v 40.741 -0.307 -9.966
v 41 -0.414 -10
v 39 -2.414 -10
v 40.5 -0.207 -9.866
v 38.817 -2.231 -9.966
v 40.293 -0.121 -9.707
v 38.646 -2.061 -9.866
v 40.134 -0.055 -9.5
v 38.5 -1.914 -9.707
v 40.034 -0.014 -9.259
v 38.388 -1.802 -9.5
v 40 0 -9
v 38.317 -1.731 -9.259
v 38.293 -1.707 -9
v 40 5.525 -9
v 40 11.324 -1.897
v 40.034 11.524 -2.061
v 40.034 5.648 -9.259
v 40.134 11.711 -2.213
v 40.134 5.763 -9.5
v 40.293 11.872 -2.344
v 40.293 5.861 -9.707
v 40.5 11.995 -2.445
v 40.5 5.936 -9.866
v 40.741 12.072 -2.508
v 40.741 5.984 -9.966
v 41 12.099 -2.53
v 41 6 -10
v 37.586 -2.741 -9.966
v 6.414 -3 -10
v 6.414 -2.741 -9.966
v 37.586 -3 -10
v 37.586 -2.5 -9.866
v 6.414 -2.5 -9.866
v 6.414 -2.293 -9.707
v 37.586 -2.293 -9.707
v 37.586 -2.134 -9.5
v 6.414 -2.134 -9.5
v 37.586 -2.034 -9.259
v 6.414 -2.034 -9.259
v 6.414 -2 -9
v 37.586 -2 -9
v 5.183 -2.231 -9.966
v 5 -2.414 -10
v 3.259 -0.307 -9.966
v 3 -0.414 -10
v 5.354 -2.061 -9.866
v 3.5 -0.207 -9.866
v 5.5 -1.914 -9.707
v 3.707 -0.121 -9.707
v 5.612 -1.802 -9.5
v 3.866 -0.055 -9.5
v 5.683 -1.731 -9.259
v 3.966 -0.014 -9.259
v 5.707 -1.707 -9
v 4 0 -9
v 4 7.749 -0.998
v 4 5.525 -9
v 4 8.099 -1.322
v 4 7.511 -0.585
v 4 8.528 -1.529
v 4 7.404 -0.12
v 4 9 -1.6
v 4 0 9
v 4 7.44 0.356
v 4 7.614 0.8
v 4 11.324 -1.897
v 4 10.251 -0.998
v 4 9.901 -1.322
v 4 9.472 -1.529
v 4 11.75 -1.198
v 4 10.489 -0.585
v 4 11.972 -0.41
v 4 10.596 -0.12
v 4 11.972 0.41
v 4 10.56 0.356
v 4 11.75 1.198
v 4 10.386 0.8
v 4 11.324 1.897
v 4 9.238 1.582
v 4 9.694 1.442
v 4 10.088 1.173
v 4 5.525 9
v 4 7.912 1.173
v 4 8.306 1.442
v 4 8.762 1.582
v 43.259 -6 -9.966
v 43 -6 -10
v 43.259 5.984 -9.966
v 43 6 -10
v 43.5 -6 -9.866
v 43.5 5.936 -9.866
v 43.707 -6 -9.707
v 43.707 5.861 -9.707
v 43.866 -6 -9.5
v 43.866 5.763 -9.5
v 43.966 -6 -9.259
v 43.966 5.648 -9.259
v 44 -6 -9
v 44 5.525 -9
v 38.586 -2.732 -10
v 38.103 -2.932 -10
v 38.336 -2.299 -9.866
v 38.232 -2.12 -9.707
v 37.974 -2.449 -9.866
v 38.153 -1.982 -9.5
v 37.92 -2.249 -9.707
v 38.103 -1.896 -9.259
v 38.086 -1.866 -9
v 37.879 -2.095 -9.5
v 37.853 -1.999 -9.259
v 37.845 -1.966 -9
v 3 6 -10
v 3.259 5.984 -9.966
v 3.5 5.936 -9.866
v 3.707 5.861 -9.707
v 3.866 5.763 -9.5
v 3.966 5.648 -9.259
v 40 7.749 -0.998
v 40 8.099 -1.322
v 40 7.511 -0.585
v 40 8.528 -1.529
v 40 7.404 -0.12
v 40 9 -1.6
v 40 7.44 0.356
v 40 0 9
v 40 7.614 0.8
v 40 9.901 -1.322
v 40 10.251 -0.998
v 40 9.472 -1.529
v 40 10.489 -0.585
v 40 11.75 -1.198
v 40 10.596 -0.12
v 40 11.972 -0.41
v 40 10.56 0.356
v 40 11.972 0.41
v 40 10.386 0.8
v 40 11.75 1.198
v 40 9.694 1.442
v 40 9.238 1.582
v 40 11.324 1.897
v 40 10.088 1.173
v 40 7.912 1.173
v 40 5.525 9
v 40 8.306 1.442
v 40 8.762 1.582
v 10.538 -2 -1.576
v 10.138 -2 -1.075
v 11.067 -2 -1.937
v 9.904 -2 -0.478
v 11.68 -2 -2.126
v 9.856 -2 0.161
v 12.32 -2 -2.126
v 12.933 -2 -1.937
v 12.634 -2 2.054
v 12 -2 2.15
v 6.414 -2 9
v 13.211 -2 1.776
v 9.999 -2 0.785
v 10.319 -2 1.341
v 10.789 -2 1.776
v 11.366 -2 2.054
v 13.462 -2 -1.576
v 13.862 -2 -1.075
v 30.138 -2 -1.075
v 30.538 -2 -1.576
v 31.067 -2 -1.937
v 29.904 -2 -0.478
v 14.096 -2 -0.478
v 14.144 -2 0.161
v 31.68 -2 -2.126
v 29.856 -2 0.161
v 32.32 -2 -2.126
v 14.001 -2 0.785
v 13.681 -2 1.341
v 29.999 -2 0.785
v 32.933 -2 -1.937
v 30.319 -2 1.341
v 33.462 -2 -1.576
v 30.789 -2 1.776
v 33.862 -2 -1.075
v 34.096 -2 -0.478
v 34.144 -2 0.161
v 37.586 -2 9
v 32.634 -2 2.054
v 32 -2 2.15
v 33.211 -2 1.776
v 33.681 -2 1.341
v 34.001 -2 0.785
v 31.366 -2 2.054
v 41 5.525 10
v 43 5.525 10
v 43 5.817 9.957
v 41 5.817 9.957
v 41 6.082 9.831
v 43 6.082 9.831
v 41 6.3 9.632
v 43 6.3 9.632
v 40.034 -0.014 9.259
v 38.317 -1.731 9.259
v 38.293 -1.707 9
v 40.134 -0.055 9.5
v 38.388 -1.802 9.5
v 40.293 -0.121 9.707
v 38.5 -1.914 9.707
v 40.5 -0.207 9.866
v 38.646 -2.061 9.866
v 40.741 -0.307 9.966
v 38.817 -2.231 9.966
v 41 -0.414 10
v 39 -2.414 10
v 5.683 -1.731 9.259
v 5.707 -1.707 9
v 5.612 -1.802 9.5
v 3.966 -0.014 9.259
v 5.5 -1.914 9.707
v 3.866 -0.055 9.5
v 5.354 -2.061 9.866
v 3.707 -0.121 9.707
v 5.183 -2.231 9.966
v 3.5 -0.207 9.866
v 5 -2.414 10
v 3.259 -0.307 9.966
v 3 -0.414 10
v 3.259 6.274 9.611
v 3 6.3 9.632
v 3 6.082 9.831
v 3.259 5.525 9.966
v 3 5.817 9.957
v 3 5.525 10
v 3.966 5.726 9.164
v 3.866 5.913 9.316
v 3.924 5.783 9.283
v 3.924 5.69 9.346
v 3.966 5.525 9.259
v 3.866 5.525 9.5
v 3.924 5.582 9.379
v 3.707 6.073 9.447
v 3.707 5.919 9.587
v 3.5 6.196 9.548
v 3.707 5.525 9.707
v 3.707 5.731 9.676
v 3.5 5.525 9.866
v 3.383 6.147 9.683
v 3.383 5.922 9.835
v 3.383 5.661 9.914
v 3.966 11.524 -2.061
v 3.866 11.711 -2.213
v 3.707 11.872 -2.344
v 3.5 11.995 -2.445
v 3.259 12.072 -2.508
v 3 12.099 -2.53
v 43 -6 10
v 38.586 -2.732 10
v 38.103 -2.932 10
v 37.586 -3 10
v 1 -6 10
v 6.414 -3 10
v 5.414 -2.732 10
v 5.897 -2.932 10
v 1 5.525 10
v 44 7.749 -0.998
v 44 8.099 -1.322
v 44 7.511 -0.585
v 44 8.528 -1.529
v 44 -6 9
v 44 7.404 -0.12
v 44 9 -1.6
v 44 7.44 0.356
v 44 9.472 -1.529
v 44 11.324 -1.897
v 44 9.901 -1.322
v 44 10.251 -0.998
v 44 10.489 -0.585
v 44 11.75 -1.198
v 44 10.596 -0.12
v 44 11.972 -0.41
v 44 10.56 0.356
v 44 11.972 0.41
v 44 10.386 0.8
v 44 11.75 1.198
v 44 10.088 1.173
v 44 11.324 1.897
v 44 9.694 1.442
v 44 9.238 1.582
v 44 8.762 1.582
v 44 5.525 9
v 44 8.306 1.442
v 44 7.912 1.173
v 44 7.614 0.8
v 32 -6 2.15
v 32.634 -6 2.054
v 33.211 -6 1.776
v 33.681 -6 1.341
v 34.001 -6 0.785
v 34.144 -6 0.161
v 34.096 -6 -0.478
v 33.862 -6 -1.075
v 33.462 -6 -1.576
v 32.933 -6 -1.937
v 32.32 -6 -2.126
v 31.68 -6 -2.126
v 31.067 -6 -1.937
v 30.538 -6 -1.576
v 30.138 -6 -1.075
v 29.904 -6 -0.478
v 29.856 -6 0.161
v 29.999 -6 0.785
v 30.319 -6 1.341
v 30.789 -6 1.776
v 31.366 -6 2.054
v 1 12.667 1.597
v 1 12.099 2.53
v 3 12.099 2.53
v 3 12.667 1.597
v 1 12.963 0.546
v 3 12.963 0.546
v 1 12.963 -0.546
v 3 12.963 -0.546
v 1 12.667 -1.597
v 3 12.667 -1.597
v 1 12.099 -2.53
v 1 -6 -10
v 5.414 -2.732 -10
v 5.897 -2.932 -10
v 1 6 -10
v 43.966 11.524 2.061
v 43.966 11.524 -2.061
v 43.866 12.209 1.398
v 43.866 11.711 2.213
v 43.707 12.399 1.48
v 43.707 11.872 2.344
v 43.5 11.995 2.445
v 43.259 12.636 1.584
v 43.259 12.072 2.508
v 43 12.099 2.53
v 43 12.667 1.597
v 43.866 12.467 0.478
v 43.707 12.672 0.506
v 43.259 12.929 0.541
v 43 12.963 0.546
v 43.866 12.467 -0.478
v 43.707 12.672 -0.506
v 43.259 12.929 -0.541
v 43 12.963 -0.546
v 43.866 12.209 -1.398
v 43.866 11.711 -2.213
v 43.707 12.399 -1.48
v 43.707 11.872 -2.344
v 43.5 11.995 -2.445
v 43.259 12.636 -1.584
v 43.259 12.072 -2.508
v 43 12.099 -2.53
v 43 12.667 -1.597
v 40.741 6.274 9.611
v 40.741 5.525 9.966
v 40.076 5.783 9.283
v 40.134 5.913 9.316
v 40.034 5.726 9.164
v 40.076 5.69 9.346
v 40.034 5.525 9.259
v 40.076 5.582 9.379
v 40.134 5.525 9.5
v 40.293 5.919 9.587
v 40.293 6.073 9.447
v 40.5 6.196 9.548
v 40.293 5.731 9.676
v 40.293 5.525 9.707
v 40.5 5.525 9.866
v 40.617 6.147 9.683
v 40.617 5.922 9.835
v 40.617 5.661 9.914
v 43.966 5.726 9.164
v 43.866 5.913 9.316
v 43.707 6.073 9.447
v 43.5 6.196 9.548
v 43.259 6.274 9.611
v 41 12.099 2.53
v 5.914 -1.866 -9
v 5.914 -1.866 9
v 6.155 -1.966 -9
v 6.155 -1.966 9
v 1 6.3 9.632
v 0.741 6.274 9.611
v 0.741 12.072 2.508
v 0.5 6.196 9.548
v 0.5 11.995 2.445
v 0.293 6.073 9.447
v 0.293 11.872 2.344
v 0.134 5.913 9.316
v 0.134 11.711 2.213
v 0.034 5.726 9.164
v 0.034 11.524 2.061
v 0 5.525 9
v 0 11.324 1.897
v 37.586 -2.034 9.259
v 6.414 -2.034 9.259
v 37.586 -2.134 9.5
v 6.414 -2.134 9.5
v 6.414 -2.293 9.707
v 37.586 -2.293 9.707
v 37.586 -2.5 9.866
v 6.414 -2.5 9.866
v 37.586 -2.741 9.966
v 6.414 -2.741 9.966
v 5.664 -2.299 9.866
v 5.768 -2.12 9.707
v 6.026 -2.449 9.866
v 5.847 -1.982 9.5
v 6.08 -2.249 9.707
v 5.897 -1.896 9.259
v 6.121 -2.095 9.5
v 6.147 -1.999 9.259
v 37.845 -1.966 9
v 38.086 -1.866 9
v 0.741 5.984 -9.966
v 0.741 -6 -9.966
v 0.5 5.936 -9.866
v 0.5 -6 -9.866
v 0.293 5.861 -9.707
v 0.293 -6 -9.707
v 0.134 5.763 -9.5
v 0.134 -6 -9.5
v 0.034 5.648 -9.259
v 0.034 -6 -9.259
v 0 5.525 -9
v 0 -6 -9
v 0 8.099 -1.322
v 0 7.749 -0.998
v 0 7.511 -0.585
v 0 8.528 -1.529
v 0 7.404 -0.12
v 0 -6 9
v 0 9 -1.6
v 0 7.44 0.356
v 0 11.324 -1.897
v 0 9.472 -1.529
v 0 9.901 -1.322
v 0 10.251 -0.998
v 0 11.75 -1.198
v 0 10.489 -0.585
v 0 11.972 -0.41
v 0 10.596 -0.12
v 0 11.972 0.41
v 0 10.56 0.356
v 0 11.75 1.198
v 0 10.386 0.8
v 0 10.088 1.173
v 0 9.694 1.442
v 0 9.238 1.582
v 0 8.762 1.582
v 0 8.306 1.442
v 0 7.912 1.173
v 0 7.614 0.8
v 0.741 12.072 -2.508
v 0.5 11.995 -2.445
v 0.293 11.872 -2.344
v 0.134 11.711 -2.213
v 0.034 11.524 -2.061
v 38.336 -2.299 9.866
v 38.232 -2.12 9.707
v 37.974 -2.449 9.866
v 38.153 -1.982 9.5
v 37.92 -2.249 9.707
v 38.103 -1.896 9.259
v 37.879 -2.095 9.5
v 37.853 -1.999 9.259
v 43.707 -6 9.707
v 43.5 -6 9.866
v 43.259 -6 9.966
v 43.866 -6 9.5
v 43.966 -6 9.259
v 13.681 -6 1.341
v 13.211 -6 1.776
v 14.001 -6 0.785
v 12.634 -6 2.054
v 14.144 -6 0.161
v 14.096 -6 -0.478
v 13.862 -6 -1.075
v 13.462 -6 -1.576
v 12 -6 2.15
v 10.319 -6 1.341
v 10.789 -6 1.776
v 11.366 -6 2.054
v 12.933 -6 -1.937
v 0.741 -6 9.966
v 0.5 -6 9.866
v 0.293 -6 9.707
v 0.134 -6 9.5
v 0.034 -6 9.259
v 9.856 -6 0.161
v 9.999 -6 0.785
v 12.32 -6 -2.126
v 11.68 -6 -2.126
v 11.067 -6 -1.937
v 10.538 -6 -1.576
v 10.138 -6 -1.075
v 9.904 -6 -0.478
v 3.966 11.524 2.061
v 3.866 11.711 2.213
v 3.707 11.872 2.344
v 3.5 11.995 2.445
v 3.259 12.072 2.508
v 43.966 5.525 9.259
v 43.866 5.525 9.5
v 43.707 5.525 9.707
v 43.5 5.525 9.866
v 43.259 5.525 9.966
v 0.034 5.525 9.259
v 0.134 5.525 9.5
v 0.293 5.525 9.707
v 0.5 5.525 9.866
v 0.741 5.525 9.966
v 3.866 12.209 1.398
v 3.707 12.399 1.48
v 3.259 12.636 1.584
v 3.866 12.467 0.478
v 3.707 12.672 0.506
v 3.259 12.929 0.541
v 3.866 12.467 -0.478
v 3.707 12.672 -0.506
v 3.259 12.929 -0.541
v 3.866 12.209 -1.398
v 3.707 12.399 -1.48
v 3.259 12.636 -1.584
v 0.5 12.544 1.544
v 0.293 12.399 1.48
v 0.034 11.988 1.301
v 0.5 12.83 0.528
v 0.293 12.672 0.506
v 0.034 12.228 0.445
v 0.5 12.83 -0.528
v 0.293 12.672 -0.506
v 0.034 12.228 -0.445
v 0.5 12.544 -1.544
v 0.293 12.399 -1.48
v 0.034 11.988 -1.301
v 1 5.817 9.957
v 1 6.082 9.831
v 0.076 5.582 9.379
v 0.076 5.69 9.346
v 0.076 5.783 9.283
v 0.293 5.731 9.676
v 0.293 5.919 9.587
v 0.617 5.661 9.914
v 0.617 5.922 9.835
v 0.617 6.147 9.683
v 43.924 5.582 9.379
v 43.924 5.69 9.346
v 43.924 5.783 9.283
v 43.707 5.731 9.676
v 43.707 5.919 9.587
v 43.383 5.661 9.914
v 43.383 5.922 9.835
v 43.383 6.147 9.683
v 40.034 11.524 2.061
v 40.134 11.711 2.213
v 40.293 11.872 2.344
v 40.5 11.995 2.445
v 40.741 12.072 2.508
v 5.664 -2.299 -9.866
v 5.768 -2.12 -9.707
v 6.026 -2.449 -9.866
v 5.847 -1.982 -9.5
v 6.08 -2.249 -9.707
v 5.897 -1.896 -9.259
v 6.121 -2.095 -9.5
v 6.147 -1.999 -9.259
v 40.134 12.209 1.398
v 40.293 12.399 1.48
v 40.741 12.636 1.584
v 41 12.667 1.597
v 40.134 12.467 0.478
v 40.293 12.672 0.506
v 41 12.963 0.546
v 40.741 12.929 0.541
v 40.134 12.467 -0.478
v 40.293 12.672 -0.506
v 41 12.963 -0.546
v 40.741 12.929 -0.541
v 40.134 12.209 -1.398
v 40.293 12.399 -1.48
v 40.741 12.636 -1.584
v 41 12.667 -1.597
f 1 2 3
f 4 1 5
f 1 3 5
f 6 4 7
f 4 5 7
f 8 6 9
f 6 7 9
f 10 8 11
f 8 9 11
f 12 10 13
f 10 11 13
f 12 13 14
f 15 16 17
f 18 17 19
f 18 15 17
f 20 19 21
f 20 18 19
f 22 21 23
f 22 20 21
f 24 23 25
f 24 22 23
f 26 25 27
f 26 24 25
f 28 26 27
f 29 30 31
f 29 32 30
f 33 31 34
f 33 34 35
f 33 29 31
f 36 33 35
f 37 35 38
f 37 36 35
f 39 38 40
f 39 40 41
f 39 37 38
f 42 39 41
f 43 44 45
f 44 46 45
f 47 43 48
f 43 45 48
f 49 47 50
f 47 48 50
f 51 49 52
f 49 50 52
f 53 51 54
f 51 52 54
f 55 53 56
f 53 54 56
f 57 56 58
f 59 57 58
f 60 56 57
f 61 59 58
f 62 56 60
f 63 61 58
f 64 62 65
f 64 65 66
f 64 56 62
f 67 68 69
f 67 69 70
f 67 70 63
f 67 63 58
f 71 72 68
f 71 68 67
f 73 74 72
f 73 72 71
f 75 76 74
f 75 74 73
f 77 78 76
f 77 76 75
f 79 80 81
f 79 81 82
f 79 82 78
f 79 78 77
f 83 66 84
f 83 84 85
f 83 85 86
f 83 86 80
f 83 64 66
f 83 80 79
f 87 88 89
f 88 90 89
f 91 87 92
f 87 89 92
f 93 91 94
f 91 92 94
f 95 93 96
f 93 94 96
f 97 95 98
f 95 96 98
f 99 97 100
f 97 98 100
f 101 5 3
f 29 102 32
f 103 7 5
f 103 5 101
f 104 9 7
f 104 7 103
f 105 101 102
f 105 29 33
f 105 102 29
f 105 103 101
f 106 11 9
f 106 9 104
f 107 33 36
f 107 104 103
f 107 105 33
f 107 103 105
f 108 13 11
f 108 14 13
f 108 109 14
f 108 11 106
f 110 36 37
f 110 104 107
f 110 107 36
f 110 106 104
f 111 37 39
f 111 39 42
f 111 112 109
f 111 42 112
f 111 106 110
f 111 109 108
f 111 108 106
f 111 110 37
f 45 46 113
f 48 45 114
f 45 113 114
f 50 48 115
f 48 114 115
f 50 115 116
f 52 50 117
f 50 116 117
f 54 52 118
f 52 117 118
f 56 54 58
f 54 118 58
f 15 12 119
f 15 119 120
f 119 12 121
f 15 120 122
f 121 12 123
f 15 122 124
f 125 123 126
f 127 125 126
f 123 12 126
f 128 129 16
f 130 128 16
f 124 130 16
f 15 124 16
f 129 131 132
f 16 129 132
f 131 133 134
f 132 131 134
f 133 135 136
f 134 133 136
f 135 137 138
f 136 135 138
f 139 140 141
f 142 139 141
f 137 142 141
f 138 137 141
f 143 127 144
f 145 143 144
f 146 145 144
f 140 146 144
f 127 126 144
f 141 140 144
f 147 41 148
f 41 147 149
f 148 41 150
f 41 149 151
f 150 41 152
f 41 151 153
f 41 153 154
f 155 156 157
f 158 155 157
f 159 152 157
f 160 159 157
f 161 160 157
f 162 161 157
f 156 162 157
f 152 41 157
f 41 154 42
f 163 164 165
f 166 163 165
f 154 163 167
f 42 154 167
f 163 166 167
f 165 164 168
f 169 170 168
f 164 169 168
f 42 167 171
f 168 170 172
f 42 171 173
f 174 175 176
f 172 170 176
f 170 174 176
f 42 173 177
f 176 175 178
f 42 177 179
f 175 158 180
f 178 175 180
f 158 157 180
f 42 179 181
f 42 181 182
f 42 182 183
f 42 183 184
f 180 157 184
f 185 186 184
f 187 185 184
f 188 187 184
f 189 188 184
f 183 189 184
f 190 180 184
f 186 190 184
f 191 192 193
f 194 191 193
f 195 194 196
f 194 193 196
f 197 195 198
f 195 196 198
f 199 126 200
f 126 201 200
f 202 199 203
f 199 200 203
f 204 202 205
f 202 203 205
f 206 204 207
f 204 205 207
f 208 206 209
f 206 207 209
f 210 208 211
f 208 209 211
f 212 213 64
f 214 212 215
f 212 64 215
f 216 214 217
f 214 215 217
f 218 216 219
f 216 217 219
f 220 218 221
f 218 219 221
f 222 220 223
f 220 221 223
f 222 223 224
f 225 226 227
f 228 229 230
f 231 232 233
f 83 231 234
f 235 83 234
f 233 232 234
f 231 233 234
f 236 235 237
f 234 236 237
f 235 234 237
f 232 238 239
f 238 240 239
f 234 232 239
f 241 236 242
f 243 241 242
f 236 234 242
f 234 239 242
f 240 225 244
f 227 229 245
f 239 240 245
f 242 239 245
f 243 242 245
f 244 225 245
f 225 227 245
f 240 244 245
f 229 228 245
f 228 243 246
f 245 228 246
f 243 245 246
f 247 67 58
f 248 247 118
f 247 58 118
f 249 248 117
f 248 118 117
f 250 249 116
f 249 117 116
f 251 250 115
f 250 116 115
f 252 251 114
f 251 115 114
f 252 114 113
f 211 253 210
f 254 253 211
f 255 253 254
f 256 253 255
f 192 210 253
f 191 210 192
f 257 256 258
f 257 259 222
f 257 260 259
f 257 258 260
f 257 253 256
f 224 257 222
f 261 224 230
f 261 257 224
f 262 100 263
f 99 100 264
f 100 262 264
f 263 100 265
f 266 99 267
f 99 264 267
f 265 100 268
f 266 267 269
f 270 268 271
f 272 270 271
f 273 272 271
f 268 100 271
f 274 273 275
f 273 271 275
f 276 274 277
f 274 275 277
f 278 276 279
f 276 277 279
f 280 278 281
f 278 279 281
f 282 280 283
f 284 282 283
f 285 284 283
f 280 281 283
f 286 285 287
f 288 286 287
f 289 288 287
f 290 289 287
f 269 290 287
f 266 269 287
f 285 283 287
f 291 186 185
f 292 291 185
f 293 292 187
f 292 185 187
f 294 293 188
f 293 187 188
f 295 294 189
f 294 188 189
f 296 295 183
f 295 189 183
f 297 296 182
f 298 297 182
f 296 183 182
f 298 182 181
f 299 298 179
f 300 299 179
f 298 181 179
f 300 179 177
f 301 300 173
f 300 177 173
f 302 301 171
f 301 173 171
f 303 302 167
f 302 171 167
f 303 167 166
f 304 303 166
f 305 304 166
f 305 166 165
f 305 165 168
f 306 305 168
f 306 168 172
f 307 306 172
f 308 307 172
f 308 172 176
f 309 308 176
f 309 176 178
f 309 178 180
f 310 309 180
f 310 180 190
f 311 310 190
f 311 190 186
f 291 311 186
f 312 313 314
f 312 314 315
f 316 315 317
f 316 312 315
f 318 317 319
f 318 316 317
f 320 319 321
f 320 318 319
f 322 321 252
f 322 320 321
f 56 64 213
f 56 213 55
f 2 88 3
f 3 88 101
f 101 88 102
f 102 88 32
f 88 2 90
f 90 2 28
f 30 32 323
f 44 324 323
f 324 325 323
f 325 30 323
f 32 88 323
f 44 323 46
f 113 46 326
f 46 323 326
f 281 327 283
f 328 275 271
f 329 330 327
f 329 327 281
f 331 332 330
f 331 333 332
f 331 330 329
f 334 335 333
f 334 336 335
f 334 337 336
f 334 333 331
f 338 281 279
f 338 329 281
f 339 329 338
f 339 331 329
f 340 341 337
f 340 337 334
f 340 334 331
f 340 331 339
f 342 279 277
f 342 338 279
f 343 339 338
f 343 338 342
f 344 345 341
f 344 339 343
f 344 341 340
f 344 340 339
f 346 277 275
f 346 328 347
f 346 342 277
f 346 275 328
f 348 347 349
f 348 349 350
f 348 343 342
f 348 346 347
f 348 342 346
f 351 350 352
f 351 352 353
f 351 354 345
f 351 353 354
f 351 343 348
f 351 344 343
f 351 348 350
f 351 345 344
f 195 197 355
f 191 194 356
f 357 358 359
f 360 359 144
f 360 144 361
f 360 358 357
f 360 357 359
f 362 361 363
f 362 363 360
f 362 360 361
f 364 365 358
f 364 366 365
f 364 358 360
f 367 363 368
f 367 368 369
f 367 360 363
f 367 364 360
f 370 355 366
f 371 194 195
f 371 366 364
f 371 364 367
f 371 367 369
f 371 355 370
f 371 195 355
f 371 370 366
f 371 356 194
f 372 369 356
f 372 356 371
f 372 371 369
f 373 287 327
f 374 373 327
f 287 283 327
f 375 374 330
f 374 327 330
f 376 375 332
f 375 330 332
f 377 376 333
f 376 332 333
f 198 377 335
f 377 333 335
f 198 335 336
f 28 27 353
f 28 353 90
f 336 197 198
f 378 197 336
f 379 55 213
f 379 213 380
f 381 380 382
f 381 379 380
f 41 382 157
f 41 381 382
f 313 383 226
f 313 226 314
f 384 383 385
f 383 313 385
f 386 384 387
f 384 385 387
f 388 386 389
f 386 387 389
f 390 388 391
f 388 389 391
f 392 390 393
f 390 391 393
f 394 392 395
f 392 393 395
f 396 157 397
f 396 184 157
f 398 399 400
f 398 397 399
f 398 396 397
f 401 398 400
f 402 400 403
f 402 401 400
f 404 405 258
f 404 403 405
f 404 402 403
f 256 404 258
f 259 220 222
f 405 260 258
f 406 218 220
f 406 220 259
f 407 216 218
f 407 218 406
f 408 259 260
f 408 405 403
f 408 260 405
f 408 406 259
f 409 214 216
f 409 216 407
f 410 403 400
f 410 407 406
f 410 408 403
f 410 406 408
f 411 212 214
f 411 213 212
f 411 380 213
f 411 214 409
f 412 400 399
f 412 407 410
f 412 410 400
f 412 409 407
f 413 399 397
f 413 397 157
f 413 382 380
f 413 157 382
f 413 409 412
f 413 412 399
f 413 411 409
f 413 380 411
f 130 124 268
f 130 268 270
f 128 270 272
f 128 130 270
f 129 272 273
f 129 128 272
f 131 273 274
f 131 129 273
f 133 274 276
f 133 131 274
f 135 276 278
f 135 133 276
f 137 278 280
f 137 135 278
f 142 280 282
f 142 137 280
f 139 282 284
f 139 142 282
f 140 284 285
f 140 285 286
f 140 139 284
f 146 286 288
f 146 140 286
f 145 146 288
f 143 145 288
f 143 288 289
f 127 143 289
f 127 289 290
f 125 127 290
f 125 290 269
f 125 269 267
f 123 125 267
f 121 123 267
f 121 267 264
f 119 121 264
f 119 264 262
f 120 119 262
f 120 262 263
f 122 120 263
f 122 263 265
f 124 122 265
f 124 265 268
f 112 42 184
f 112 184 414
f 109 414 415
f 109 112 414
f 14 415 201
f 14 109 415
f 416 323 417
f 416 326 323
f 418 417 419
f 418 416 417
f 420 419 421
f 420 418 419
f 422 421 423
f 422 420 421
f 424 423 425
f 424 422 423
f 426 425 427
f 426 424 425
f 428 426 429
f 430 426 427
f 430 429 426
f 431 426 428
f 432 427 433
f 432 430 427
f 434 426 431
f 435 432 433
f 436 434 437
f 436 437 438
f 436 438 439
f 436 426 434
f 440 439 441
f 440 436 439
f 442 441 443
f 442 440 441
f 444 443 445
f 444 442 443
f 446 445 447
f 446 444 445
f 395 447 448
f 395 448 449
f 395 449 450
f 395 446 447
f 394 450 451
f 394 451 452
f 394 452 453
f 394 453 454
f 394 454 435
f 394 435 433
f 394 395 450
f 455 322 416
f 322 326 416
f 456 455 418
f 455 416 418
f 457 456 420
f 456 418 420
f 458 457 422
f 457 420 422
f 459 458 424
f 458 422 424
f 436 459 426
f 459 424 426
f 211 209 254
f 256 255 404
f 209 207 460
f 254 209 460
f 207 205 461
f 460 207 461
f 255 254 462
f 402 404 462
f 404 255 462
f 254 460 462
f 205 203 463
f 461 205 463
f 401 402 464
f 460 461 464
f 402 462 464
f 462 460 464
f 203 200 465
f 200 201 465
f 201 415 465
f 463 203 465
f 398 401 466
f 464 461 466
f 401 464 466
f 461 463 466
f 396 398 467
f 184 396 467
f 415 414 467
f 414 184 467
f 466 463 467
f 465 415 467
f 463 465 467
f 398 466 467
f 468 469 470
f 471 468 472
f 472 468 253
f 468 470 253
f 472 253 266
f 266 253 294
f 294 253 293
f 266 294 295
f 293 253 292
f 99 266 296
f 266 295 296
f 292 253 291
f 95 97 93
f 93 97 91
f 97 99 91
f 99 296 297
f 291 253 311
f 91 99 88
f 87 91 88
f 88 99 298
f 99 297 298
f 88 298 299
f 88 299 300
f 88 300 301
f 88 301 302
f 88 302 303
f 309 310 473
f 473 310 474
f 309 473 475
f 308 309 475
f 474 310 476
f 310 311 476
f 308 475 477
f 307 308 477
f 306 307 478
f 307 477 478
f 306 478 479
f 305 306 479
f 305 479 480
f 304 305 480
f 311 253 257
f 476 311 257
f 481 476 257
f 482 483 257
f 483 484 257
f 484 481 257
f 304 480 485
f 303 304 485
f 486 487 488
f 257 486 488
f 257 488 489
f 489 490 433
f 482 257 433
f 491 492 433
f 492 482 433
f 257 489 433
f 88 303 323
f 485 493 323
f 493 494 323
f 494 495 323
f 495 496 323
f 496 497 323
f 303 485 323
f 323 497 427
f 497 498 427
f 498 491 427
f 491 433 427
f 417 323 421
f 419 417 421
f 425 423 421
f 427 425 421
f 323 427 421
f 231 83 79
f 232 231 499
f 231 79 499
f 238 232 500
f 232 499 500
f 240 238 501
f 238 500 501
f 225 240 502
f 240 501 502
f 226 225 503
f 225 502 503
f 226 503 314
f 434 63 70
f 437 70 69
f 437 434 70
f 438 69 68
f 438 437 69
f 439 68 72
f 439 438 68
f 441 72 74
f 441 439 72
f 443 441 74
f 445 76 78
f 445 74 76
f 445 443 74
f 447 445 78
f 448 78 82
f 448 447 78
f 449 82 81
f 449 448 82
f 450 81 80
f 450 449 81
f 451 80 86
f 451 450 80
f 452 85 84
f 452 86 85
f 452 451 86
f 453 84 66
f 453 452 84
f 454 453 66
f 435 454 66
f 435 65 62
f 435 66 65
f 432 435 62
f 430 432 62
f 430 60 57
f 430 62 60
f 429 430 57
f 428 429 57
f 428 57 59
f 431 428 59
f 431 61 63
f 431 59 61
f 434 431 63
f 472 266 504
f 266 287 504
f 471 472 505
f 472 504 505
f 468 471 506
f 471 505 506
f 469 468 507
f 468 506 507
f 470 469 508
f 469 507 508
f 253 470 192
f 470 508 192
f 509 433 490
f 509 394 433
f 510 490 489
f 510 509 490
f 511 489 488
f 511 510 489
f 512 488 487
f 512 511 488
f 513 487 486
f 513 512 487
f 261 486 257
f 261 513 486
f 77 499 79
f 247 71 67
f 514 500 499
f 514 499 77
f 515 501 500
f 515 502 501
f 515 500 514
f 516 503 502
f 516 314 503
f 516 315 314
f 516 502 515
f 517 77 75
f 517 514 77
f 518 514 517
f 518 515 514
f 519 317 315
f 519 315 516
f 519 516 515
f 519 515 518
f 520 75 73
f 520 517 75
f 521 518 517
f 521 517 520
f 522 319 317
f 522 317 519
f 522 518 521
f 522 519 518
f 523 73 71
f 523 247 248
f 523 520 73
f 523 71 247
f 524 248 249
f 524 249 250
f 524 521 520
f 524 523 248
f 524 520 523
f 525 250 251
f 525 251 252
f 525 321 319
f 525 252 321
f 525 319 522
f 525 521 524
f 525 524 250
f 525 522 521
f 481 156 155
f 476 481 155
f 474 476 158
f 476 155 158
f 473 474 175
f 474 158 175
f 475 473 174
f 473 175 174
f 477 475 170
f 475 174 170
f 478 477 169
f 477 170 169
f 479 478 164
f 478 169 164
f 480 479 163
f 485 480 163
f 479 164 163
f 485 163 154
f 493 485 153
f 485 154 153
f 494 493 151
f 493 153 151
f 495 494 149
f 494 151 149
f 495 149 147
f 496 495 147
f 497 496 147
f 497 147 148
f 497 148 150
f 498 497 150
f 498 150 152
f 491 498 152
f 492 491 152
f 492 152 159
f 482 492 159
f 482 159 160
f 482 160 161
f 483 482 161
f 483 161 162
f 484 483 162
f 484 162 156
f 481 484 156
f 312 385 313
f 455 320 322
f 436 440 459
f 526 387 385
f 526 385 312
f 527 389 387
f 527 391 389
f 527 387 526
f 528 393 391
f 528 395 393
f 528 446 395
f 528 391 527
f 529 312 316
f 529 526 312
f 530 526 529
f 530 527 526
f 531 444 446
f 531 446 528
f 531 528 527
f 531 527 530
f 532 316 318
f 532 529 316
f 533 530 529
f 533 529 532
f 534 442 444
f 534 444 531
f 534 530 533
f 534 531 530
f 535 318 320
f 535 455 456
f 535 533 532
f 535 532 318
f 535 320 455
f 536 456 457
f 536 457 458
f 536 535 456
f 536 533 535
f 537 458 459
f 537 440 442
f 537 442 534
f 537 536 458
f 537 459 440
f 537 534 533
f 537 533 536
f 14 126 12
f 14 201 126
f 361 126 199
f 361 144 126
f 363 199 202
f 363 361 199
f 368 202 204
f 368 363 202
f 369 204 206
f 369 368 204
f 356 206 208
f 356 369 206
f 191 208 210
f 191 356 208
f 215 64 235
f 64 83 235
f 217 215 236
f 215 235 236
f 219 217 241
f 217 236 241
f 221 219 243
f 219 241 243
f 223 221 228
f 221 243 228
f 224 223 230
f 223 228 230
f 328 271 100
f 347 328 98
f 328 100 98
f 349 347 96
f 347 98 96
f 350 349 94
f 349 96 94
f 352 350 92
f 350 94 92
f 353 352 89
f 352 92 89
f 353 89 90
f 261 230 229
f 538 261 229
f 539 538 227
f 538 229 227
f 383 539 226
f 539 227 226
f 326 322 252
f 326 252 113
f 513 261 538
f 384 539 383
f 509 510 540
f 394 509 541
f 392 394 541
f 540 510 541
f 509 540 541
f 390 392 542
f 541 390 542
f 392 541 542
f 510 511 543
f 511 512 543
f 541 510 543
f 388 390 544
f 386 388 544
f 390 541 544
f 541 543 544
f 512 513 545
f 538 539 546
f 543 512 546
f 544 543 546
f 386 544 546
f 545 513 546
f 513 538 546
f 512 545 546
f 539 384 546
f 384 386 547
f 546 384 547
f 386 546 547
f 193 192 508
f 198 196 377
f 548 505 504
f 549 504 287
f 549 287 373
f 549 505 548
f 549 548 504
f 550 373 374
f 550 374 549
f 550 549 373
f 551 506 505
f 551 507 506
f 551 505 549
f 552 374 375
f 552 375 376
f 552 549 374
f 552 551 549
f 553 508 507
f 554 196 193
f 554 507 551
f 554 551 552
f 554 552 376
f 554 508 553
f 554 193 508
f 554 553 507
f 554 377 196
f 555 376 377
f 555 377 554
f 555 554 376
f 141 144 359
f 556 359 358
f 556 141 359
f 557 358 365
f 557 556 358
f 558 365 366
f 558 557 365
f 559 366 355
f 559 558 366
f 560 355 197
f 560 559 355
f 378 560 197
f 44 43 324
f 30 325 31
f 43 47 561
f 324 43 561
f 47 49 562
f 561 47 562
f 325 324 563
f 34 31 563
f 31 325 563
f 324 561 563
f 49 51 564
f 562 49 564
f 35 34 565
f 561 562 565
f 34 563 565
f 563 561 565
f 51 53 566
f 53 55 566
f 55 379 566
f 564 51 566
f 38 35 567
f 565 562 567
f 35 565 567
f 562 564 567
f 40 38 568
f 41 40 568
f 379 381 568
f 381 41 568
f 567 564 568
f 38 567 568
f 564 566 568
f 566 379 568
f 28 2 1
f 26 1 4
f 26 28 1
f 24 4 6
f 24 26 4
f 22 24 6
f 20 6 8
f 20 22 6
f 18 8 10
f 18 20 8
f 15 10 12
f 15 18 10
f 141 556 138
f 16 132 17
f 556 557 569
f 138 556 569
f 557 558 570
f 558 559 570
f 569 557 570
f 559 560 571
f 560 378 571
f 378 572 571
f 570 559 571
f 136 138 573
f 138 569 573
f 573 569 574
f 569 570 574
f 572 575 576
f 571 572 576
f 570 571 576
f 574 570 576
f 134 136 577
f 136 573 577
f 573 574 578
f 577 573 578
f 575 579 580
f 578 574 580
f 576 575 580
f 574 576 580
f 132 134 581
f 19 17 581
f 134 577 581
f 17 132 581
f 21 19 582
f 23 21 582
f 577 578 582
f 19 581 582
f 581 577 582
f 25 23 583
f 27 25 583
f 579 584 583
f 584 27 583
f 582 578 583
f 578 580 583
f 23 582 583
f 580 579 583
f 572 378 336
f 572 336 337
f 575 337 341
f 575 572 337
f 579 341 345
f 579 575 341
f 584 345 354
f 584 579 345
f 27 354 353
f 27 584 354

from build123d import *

# Parameters (mm, degrees)
SKETCH1_W           = 20
SKETCH1_H           = 12
SKETCH1_R           = 1.6
BOSS_EXTRUDE1_DEPTH = 44
SKETCH2_W           = 36
SKETCH2_H           = 15
CUT_EXTRUDE1_DEPTH  = 51.049975025
CHAMFER1_SIZE       = 2
FILLET1_R           = 1
SKETCH3_R           = 2.15
CUT_EXTRUDE2_DEPTH  = 48.549973712


with BuildPart() as part:
    # Sketch1 → Boss-Extrude1 (new body)
    # profile 1 of 2: a face of its own
    with BuildSketch(Plane(origin=(0, 0, 0), x_dir=(0, 0, -1), z_dir=(1, 0, 0))):
        Rectangle(SKETCH1_W, SKETCH1_H)
    # profile 2 of 2: a face of its own
    with BuildSketch(Plane(origin=(0, 0, 0), x_dir=(0, 0, -1), z_dir=(1, 0, 0))):
        with BuildLine():
            ThreePointArc((-2.529576231, 12.098587435), (0, 13), (2.529576231, 12.098587435))
            Line((2.529576231, 12.098587435), (10, 6))
            Line((10, 6), (-10, 6))
            Line((-10, 6), (-2.529576231, 12.098587435))
        make_face()
        with Locations((0, 9)):
            Circle(SKETCH1_R, mode=Mode.SUBTRACT)
    extrude(amount=BOSS_EXTRUDE1_DEPTH)

    # Sketch2 → Cut-Extrude1 (cut, through all)
    with BuildSketch(Plane.XY.offset(10)):
        with Locations((22, 5.5)):
            Rectangle(SKETCH2_W, SKETCH2_H)
    extrude(amount=-CUT_EXTRUDE1_DEPTH, mode=Mode.SUBTRACT)

    # Chamfer1
    chamfer1_edges = [part.edges().sort_by_distance(p)[0] for p in [
        (4, -2, 0),
        (40, -2, 0),
    ]]
    chamfer(chamfer1_edges, length=CHAMFER1_SIZE)

    # Fillet1
    fillet1_edges = [part.edges().sort_by_distance(p)[0] for p in [
        (0, 9.049293718, -6.264788115),
        (0, 0, -10),
        (44, 9.049293718, -6.264788115),
        (42, 6, 10),
        (44, 13, 0),
        (44, 9.049293718, 6.264788115),
        (2, 6, 10),
        (44, 0, 10),
        (4, 9.049293718, -6.264788115),
        (4, 3, -10),
        (4, 13, 0),
        (4, 9.049293718, 6.264788115),
        (40, 9.049293718, -6.264788115),
        (40, 9.049293718, 6.264788115),
        (40, 13, 0),
        (4, 3, 10),
        (40, 3, -10),
        (40, 3, 10),
        (22, -2, 10),
        (22, -2, -10),
        (6, -2, 0),
        (38, -2, 0),
        (39, -1, 10),
        (39, -1, -10),
        (5, -1, 10),
        (5, -1, -10),
        (0, 0, 10),
        (44, 0, -10),
        (0, 9.049293718, 6.264788115),
        (0, 13, 0),
    ]]
    fillet(fillet1_edges, radius=FILLET1_R)

    # Sketch3 → Cut-Extrude2 (cut, through all)
    with BuildSketch(Plane(origin=(0, -2, 0), x_dir=(1, 0, 0), z_dir=(0, 1, 0))):
        with Locations(Location((12, 0, 0), (0, 0, 270))):
            Circle(SKETCH3_R)
        with Locations(Location((32, 0, 0), (0, 0, 270))):
            Circle(SKETCH3_R)
    extrude(amount=-CUT_EXTRUDE2_DEPTH, mode=Mode.SUBTRACT)


solid = part.part
